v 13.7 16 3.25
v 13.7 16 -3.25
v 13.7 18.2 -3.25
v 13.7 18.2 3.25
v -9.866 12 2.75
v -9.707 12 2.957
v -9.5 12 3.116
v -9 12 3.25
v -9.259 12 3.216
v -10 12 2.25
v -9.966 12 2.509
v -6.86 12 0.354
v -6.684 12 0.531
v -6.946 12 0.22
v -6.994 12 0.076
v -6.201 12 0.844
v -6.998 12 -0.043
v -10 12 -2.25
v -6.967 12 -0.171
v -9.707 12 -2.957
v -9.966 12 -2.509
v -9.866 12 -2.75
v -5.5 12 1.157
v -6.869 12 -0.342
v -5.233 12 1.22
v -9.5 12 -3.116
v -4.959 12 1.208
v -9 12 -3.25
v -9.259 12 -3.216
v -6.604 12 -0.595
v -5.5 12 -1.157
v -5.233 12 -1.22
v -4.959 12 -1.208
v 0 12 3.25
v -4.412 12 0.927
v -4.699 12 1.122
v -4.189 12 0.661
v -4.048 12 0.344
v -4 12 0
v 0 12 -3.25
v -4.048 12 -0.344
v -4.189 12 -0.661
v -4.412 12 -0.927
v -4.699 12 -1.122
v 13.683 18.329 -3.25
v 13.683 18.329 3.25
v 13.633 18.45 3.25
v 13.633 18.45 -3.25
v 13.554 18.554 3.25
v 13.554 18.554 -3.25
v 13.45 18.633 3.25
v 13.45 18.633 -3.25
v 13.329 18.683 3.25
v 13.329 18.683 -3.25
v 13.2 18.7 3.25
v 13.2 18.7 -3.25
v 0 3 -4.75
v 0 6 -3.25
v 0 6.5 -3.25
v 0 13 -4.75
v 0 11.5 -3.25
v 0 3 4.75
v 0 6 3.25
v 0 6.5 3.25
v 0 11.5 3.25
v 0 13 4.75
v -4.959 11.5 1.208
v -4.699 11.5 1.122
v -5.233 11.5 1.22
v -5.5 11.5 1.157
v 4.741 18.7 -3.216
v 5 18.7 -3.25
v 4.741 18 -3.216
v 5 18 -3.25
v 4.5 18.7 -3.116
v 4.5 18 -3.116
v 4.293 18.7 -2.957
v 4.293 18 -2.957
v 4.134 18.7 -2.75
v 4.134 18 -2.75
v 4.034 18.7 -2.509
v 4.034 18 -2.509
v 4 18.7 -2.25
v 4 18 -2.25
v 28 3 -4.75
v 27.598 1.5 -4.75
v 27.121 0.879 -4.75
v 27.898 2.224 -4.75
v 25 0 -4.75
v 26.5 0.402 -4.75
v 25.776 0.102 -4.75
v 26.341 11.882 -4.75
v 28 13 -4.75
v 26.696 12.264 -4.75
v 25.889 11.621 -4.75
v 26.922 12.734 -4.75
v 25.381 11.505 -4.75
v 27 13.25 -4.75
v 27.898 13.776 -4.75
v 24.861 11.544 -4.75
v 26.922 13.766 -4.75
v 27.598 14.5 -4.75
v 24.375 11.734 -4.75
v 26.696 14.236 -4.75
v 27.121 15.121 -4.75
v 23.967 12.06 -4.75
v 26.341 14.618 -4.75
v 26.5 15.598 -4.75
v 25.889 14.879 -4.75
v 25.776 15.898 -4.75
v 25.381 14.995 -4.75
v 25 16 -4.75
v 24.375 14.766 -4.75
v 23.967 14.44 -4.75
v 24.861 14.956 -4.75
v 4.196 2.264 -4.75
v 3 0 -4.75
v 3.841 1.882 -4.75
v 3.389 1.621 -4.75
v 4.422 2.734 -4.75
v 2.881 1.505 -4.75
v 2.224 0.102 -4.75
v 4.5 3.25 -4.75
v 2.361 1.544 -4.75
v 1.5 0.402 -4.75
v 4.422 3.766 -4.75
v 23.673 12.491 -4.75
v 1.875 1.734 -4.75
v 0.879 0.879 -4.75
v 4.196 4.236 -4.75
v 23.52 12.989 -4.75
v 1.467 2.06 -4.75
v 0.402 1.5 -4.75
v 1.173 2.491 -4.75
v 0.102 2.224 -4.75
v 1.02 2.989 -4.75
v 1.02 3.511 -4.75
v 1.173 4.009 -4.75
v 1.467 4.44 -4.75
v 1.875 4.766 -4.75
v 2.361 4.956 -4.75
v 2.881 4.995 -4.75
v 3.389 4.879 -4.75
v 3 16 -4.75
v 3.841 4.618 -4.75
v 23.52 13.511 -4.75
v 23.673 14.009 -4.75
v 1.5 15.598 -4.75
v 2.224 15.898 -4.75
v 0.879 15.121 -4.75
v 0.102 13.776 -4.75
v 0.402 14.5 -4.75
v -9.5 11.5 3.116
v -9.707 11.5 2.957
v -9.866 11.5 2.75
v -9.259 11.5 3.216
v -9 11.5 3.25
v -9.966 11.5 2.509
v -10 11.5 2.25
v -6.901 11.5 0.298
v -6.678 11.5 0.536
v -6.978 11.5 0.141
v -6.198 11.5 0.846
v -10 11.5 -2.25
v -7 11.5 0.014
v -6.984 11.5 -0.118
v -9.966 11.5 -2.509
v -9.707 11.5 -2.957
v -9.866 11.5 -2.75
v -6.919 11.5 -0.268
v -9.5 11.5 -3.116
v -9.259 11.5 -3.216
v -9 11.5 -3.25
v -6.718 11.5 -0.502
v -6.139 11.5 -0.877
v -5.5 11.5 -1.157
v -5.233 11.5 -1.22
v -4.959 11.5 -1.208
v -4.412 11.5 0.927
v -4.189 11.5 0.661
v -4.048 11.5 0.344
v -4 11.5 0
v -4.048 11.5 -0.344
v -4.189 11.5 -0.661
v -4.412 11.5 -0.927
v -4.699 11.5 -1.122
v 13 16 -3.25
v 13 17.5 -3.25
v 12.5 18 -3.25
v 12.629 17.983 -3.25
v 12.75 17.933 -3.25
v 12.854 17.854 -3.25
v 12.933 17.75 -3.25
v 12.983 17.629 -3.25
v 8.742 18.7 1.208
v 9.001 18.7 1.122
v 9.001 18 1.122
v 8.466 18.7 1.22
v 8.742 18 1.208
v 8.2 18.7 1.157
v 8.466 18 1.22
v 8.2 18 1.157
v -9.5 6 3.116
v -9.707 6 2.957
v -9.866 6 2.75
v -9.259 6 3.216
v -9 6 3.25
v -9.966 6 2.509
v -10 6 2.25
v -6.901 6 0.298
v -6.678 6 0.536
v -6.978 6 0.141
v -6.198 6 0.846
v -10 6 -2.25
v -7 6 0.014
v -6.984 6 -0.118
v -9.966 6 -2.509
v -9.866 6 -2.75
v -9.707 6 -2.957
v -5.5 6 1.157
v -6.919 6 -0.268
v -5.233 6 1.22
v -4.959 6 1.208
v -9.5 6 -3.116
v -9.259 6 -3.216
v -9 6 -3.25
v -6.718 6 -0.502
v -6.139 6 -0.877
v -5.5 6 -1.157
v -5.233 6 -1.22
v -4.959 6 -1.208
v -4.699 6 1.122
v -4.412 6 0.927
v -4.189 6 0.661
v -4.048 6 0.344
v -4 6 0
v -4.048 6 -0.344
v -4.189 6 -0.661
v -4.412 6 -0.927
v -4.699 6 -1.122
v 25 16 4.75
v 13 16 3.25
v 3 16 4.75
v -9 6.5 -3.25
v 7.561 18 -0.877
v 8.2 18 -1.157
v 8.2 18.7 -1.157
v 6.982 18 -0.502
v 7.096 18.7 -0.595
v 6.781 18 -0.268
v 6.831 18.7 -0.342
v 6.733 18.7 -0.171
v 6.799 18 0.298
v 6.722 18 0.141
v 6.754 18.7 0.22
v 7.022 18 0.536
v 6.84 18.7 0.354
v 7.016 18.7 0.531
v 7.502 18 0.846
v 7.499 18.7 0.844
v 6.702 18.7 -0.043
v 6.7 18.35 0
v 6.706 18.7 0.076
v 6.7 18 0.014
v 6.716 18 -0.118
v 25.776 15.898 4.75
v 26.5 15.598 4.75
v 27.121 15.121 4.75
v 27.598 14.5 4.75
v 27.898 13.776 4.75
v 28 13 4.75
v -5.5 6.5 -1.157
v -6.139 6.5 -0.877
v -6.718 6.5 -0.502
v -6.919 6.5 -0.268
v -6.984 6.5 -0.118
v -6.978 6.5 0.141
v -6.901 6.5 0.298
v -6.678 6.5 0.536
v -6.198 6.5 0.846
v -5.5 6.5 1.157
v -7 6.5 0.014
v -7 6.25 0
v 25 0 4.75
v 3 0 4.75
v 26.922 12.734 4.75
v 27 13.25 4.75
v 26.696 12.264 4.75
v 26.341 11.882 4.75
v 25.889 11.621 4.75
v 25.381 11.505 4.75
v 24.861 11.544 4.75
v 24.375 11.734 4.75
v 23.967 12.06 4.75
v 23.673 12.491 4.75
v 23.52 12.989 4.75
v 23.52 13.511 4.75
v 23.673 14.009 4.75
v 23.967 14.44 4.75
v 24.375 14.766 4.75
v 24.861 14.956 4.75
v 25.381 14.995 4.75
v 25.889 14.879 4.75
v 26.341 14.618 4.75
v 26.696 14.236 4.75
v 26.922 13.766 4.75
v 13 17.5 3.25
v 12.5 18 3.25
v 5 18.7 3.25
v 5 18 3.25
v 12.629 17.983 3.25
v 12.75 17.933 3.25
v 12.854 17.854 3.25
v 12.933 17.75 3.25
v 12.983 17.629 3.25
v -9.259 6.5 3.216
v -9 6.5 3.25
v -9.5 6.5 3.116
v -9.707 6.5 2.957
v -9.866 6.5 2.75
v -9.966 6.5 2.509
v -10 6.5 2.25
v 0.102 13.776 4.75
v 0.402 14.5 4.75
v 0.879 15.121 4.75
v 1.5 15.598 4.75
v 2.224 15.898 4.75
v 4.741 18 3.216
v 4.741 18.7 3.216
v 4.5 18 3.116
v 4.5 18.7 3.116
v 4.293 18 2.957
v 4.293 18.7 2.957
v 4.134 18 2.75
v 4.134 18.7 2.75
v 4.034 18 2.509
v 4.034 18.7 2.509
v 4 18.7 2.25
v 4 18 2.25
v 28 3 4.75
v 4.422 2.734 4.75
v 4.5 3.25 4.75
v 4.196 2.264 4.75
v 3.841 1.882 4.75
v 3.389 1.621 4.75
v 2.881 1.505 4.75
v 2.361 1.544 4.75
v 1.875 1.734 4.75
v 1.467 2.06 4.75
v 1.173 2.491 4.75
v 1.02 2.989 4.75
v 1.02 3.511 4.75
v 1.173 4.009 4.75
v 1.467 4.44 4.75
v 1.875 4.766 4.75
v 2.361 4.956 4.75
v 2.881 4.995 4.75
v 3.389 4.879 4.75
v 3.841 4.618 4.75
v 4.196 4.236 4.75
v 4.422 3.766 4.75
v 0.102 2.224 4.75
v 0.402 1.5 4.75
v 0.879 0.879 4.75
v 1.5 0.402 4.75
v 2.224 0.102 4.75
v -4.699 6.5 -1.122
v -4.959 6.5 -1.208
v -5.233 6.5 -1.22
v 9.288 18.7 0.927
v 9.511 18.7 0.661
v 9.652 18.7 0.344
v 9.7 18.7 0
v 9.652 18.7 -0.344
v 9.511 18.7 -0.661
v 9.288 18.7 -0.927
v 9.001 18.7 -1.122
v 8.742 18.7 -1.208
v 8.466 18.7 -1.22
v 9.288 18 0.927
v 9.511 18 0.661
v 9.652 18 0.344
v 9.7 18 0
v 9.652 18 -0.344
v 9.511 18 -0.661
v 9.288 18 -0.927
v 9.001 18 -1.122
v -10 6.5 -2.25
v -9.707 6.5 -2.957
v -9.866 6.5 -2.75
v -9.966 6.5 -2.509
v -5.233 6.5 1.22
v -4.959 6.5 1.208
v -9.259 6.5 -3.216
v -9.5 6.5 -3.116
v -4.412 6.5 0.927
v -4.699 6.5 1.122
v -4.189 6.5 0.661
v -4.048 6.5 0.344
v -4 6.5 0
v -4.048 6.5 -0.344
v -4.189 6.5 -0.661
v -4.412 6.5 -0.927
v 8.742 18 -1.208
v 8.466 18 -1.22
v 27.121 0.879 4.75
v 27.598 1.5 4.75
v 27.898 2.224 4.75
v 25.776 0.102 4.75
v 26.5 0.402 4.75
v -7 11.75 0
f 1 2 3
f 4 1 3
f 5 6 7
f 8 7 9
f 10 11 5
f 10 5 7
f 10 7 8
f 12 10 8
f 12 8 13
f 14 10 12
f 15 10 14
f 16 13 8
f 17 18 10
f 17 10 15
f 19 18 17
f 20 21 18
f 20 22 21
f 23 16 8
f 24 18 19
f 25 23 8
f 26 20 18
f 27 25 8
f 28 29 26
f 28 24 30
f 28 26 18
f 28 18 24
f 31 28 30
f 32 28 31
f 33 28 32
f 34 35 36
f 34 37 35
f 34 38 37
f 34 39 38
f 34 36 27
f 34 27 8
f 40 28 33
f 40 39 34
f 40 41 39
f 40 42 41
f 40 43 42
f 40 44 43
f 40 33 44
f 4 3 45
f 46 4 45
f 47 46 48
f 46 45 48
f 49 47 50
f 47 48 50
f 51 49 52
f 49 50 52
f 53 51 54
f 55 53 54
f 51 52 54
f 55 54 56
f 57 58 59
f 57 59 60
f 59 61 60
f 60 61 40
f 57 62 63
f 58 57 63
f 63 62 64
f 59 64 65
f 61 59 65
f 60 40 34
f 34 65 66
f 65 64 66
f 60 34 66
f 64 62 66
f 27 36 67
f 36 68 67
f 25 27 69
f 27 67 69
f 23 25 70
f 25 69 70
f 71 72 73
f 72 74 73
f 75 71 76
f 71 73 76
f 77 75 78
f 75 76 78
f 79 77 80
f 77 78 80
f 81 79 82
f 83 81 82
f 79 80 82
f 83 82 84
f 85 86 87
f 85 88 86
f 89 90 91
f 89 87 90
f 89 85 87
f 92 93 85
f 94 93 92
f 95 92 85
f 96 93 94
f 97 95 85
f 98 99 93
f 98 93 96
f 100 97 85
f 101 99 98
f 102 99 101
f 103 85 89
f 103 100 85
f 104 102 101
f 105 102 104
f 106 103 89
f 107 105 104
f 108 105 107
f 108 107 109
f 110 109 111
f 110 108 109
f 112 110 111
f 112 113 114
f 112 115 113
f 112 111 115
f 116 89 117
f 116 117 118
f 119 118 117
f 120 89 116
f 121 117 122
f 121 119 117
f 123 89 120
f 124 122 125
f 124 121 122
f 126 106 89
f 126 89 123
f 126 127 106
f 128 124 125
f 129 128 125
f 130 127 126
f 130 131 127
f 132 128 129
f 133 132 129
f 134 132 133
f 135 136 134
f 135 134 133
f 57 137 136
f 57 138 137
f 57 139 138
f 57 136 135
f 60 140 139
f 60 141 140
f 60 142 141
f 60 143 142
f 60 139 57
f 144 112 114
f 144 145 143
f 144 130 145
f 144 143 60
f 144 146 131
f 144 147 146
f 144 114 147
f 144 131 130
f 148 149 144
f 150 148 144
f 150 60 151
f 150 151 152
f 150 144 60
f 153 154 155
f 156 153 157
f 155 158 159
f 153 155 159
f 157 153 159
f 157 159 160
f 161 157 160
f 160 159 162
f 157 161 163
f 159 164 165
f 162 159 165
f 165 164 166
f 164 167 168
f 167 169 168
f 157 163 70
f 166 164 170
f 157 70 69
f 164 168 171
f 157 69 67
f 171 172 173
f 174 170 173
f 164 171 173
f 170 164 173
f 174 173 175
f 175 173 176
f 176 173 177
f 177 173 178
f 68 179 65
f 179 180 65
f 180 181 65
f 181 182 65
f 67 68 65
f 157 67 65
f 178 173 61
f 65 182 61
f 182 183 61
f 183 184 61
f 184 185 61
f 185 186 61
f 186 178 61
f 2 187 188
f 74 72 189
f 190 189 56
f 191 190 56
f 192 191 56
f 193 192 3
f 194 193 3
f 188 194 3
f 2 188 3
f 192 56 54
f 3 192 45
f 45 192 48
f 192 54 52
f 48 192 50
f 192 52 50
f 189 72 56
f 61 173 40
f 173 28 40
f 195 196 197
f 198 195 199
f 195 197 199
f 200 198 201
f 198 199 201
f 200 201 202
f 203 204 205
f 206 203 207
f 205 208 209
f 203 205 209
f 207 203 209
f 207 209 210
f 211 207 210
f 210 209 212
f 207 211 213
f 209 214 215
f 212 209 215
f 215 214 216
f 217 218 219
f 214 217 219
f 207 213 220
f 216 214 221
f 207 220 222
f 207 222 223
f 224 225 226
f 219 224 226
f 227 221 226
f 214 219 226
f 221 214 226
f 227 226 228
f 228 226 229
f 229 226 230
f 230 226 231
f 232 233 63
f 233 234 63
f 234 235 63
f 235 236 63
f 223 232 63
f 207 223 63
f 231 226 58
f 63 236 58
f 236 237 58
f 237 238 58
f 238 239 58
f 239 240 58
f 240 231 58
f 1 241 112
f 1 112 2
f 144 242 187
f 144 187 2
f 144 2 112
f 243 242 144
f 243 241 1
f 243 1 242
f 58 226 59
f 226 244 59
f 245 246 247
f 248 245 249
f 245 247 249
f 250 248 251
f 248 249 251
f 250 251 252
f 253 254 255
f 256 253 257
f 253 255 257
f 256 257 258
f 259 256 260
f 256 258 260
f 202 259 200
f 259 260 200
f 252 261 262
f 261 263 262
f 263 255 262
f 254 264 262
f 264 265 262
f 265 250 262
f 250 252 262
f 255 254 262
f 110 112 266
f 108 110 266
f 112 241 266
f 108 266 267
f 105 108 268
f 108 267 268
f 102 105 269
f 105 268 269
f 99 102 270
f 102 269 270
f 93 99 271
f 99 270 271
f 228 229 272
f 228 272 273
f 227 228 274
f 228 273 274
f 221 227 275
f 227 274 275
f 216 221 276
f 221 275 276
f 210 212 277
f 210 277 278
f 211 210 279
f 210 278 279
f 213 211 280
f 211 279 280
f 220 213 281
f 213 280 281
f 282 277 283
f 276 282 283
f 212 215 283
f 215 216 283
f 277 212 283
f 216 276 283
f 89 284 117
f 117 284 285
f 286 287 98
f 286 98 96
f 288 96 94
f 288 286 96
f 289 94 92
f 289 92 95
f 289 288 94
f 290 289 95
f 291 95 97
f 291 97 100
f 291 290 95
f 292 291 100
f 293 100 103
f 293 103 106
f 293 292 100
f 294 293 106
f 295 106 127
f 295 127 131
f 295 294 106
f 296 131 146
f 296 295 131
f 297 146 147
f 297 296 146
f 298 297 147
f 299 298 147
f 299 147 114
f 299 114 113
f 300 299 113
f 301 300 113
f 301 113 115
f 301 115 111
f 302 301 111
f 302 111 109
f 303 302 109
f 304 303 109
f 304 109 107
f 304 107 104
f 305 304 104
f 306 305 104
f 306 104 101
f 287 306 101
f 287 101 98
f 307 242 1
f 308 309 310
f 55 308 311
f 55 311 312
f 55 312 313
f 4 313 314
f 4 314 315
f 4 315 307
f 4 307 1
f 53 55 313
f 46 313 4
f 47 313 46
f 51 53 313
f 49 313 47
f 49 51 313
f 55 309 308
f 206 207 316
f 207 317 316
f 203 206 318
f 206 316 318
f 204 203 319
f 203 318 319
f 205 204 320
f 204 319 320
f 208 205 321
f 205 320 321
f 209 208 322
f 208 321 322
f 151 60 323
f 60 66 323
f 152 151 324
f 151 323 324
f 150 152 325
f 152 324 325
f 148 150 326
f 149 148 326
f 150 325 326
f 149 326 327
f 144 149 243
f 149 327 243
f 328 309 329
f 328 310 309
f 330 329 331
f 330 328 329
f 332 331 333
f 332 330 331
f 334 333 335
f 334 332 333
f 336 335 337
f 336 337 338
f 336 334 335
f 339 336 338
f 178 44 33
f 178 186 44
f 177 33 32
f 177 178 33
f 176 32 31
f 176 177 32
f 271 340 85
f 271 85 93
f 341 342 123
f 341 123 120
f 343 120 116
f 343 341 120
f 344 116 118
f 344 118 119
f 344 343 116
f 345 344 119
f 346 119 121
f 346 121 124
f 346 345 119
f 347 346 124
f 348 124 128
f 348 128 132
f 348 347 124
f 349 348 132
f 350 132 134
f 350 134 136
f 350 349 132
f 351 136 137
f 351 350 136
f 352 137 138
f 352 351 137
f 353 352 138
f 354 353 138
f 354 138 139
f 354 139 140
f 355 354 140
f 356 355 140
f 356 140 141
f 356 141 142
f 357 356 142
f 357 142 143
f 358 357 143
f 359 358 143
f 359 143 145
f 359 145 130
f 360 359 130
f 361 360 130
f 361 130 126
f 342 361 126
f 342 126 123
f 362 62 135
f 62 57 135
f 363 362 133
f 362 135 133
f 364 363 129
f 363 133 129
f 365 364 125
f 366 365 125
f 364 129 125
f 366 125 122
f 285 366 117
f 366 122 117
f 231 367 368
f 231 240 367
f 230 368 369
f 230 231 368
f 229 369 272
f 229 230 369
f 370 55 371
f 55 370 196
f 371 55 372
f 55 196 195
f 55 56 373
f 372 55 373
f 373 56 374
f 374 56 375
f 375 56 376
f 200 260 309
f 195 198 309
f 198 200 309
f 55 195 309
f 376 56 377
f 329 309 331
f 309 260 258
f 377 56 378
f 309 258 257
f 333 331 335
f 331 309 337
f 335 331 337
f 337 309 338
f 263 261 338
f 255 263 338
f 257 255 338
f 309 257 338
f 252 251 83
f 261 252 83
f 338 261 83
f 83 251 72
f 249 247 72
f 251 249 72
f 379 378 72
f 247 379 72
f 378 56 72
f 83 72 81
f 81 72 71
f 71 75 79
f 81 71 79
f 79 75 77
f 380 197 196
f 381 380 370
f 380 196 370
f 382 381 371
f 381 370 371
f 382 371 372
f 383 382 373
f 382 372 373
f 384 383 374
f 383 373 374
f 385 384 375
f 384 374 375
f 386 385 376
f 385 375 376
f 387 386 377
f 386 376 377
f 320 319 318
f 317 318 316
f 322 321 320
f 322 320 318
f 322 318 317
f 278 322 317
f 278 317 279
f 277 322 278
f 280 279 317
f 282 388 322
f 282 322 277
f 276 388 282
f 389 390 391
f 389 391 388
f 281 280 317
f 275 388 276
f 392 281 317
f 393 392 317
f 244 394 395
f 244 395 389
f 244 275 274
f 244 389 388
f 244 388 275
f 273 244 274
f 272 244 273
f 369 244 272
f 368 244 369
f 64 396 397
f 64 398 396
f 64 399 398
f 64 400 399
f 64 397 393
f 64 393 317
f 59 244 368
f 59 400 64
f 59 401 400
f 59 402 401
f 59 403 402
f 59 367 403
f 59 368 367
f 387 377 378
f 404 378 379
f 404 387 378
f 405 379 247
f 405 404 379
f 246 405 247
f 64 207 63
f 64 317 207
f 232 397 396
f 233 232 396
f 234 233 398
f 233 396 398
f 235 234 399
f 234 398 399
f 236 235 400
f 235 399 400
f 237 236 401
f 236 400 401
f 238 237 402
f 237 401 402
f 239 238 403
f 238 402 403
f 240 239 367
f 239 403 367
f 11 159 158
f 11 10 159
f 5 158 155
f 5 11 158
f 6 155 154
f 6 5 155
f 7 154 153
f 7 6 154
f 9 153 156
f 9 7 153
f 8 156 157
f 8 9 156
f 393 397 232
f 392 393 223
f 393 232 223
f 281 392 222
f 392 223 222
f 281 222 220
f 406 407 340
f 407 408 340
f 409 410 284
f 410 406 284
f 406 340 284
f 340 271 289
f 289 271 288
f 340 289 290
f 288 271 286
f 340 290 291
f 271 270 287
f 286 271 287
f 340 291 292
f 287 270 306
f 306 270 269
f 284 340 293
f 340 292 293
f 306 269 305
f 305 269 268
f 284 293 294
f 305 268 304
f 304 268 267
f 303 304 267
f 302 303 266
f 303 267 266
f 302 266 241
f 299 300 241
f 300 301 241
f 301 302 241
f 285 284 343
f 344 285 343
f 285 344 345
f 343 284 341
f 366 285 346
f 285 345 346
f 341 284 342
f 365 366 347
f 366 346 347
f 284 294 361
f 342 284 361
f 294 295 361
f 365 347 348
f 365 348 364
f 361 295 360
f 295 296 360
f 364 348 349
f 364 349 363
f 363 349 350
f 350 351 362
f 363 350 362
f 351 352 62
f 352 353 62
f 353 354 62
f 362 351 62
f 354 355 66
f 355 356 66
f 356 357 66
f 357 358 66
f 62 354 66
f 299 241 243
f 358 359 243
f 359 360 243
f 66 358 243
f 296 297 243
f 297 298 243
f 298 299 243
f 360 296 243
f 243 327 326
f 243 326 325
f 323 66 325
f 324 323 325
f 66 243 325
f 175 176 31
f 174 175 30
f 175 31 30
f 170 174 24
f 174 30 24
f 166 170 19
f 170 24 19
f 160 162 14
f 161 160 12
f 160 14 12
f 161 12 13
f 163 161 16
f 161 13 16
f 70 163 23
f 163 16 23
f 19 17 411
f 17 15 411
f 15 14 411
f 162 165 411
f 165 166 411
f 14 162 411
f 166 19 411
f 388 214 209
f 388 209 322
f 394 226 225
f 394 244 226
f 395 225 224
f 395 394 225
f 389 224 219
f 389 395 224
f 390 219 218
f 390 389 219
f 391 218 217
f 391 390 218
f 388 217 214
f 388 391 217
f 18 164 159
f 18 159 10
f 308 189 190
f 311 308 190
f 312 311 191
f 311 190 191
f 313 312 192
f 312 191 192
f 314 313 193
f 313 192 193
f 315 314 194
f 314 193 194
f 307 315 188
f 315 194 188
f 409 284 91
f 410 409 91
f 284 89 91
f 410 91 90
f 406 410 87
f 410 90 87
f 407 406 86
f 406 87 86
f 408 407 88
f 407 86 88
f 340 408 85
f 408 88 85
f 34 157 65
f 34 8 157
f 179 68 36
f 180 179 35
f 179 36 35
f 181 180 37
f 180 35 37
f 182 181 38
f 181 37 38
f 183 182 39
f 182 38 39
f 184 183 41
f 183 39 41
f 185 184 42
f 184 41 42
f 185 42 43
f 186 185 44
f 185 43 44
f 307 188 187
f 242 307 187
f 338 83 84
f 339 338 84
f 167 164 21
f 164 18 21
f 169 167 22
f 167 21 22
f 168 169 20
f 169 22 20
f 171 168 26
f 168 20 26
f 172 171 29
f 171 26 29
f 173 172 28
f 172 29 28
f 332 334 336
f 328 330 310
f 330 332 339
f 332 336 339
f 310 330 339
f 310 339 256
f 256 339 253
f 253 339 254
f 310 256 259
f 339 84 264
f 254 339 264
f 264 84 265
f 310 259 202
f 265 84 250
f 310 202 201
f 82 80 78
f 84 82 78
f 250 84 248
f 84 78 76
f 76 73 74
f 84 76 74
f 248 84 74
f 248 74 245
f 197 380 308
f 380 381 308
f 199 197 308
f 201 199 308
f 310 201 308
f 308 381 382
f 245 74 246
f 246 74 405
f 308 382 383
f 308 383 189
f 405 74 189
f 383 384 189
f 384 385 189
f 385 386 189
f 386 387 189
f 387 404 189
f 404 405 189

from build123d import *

# Parameters (mm, degrees)
BOSS_EXTRUDE1_DEPTH      = 3.25
BOSS_EXTRUDE1_DEPTH_BACK = 3.25
SKETCH1_W                = 10
SKETCH1_H                = 0.5
SKETCH1_W_2              = 28
SKETCH1_H_2              = 16
SKETCH1_R                = 1.75
BOSS_EXTRUDE2_DEPTH      = 1.5
BOSS_EXTRUDE2_DEPTH_BACK = 8
SKETCH2_W                = 28
SKETCH2_H                = 16
SKETCH2_R                = 1.75
CUT_EXTRUDE1_DEPTH       = 9.5
CUT_EXTRUDE2_DEPTH       = 1.5
FILLET1_R                = 1
FILLET2_R                = 1
FILLET3_R                = 3


with BuildPart() as part:
    # Sketch1 → Boss-Extrude1 (new, two sides: drawn at the far end of the back side and taken through both)
    # profile 1 of 4: a face of its own
    with BuildSketch(Plane.XY.offset(-BOSS_EXTRUDE1_DEPTH_BACK)):
        with Locations((-5, 6.25)):
            Rectangle(SKETCH1_W, SKETCH1_H)
    # profile 2 of 4: a face of its own
    with BuildSketch(Plane.XY.offset(-BOSS_EXTRUDE1_DEPTH_BACK)):
        with Locations((-5, 11.75)):
            Rectangle(SKETCH1_W, SKETCH1_H)
    # profile 3 of 4: a face of its own
    with BuildSketch(Plane.XY.offset(-BOSS_EXTRUDE1_DEPTH_BACK)):
        with Locations((14, 8)):
            Rectangle(SKETCH1_W_2, SKETCH1_H_2)
        with Locations((2.75, 3.25)):
            Circle(SKETCH1_R, mode=Mode.SUBTRACT)
        with Locations((25.25, 13.25)):
            Circle(SKETCH1_R, mode=Mode.SUBTRACT)
    # profile 4 of 4: a face of its own
    with BuildSketch(Plane.XY.offset(-BOSS_EXTRUDE1_DEPTH_BACK)):
        with BuildLine():
            Line((13, 16), (13.7, 16))
            Line((13.7, 16), (13.7, 18.2))
            ThreePointArc((13.7, 18.2), (13.553553391, 18.553553391), (13.2, 18.7))
            Line((13.2, 18.7), (4, 18.7))
            Line((4, 18.7), (4, 18))
            Line((4, 18), (12.5, 18))
            ThreePointArc((12.5, 18), (12.853553391, 17.853553391), (13, 17.5))
            Line((13, 17.5), (13, 16))
        make_face()
    extrude(amount=BOSS_EXTRUDE1_DEPTH + BOSS_EXTRUDE1_DEPTH_BACK)

    # Sketch2 → Boss-Extrude2 (add, two sides: drawn at the far end of the back side and taken through both)
    with BuildSketch(Plane(origin=(0, 0, -3.25), x_dir=(-1, 0, 0), z_dir=(0, 0, -1)).offset(-BOSS_EXTRUDE2_DEPTH_BACK)):
        with Locations((-14, 8)):
            Rectangle(SKETCH2_W, SKETCH2_H)
        with Locations(Location((-25.25, 13.25, 0), (0, 0, 180))):
            Circle(SKETCH2_R, mode=Mode.SUBTRACT)
        with Locations(Location((-2.75, 3.25, 0), (0, 0, 180))):
            Circle(SKETCH2_R, mode=Mode.SUBTRACT)
    extrude(amount=BOSS_EXTRUDE2_DEPTH + BOSS_EXTRUDE2_DEPTH_BACK)

    # Sketch3 → Cut-Extrude1 (cut)
    with BuildSketch(Plane(origin=(0, 12, 0), x_dir=(1, 0, 0), z_dir=(0, 1, 0))):
        with BuildLine():
            ThreePointArc((-5.25, -1.25), (-4, 0), (-5.25, 1.25))
            add(Edge.make_bspline(
                [(-5.25, 1.25), (-8.75, 0), (-5.25, -1.25)],
                knots=[0.849927106, 0.849927106, 0.849927106, 1.849927106, 1.849927106, 1.849927106], degree=2))
        make_face()
    extrude(amount=-CUT_EXTRUDE1_DEPTH, mode=Mode.SUBTRACT)

    # Sketch4 → Cut-Extrude2 (cut)
    with BuildSketch(Plane(origin=(0, 18.7, 0), x_dir=(1, 0, 0), z_dir=(0, 1, 0))):
        with BuildLine():
            ThreePointArc((8.45, -1.25), (9.7, 0), (8.45, 1.25))
            add(Edge.make_bspline(
                [(8.45, 1.25), (4.95, 0), (8.45, -1.25)],
                knots=[0.849927106, 0.849927106, 0.849927106, 1.849927106, 1.849927106, 1.849927106], degree=2))
        make_face()
    extrude(amount=-CUT_EXTRUDE2_DEPTH, mode=Mode.SUBTRACT)

    # Fillet1
    fillet1_edges = [part.edges().sort_by_distance(p)[0] for p in [
        (-5.25, 6.25, 1.25),
        (-5.25, 6.25, -1.25),
        (-5.25, 11.75, 1.25),
        (-5.25, 11.75, -1.25),
        (8.45, 18.35, -1.25),
        (8.45, 18.35, 1.25),
    ]]
    fillet(fillet1_edges, radius=FILLET1_R)

    # Fillet2
    fillet2_edges = [part.edges().sort_by_distance(p)[0] for p in [
        (-10, 6.25, -3.25),
        (4, 18.35, -3.25),
        (-10, 6.25, 3.25),
        (-10, 11.75, 3.25),
        (4, 18.35, 3.25),
        (-10, 11.75, -3.25),
    ]]
    fillet(fillet2_edges, radius=FILLET2_R)

    # Fillet3
    fillet3_edges = [part.edges().sort_by_distance(p)[0] for p in [
        (0, 16, 0),
        (28, 16, 0),
        (28, 0, 0),
        (0, 0, 0),
    ]]
    fillet(fillet3_edges, radius=FILLET3_R)


solid = part.part
